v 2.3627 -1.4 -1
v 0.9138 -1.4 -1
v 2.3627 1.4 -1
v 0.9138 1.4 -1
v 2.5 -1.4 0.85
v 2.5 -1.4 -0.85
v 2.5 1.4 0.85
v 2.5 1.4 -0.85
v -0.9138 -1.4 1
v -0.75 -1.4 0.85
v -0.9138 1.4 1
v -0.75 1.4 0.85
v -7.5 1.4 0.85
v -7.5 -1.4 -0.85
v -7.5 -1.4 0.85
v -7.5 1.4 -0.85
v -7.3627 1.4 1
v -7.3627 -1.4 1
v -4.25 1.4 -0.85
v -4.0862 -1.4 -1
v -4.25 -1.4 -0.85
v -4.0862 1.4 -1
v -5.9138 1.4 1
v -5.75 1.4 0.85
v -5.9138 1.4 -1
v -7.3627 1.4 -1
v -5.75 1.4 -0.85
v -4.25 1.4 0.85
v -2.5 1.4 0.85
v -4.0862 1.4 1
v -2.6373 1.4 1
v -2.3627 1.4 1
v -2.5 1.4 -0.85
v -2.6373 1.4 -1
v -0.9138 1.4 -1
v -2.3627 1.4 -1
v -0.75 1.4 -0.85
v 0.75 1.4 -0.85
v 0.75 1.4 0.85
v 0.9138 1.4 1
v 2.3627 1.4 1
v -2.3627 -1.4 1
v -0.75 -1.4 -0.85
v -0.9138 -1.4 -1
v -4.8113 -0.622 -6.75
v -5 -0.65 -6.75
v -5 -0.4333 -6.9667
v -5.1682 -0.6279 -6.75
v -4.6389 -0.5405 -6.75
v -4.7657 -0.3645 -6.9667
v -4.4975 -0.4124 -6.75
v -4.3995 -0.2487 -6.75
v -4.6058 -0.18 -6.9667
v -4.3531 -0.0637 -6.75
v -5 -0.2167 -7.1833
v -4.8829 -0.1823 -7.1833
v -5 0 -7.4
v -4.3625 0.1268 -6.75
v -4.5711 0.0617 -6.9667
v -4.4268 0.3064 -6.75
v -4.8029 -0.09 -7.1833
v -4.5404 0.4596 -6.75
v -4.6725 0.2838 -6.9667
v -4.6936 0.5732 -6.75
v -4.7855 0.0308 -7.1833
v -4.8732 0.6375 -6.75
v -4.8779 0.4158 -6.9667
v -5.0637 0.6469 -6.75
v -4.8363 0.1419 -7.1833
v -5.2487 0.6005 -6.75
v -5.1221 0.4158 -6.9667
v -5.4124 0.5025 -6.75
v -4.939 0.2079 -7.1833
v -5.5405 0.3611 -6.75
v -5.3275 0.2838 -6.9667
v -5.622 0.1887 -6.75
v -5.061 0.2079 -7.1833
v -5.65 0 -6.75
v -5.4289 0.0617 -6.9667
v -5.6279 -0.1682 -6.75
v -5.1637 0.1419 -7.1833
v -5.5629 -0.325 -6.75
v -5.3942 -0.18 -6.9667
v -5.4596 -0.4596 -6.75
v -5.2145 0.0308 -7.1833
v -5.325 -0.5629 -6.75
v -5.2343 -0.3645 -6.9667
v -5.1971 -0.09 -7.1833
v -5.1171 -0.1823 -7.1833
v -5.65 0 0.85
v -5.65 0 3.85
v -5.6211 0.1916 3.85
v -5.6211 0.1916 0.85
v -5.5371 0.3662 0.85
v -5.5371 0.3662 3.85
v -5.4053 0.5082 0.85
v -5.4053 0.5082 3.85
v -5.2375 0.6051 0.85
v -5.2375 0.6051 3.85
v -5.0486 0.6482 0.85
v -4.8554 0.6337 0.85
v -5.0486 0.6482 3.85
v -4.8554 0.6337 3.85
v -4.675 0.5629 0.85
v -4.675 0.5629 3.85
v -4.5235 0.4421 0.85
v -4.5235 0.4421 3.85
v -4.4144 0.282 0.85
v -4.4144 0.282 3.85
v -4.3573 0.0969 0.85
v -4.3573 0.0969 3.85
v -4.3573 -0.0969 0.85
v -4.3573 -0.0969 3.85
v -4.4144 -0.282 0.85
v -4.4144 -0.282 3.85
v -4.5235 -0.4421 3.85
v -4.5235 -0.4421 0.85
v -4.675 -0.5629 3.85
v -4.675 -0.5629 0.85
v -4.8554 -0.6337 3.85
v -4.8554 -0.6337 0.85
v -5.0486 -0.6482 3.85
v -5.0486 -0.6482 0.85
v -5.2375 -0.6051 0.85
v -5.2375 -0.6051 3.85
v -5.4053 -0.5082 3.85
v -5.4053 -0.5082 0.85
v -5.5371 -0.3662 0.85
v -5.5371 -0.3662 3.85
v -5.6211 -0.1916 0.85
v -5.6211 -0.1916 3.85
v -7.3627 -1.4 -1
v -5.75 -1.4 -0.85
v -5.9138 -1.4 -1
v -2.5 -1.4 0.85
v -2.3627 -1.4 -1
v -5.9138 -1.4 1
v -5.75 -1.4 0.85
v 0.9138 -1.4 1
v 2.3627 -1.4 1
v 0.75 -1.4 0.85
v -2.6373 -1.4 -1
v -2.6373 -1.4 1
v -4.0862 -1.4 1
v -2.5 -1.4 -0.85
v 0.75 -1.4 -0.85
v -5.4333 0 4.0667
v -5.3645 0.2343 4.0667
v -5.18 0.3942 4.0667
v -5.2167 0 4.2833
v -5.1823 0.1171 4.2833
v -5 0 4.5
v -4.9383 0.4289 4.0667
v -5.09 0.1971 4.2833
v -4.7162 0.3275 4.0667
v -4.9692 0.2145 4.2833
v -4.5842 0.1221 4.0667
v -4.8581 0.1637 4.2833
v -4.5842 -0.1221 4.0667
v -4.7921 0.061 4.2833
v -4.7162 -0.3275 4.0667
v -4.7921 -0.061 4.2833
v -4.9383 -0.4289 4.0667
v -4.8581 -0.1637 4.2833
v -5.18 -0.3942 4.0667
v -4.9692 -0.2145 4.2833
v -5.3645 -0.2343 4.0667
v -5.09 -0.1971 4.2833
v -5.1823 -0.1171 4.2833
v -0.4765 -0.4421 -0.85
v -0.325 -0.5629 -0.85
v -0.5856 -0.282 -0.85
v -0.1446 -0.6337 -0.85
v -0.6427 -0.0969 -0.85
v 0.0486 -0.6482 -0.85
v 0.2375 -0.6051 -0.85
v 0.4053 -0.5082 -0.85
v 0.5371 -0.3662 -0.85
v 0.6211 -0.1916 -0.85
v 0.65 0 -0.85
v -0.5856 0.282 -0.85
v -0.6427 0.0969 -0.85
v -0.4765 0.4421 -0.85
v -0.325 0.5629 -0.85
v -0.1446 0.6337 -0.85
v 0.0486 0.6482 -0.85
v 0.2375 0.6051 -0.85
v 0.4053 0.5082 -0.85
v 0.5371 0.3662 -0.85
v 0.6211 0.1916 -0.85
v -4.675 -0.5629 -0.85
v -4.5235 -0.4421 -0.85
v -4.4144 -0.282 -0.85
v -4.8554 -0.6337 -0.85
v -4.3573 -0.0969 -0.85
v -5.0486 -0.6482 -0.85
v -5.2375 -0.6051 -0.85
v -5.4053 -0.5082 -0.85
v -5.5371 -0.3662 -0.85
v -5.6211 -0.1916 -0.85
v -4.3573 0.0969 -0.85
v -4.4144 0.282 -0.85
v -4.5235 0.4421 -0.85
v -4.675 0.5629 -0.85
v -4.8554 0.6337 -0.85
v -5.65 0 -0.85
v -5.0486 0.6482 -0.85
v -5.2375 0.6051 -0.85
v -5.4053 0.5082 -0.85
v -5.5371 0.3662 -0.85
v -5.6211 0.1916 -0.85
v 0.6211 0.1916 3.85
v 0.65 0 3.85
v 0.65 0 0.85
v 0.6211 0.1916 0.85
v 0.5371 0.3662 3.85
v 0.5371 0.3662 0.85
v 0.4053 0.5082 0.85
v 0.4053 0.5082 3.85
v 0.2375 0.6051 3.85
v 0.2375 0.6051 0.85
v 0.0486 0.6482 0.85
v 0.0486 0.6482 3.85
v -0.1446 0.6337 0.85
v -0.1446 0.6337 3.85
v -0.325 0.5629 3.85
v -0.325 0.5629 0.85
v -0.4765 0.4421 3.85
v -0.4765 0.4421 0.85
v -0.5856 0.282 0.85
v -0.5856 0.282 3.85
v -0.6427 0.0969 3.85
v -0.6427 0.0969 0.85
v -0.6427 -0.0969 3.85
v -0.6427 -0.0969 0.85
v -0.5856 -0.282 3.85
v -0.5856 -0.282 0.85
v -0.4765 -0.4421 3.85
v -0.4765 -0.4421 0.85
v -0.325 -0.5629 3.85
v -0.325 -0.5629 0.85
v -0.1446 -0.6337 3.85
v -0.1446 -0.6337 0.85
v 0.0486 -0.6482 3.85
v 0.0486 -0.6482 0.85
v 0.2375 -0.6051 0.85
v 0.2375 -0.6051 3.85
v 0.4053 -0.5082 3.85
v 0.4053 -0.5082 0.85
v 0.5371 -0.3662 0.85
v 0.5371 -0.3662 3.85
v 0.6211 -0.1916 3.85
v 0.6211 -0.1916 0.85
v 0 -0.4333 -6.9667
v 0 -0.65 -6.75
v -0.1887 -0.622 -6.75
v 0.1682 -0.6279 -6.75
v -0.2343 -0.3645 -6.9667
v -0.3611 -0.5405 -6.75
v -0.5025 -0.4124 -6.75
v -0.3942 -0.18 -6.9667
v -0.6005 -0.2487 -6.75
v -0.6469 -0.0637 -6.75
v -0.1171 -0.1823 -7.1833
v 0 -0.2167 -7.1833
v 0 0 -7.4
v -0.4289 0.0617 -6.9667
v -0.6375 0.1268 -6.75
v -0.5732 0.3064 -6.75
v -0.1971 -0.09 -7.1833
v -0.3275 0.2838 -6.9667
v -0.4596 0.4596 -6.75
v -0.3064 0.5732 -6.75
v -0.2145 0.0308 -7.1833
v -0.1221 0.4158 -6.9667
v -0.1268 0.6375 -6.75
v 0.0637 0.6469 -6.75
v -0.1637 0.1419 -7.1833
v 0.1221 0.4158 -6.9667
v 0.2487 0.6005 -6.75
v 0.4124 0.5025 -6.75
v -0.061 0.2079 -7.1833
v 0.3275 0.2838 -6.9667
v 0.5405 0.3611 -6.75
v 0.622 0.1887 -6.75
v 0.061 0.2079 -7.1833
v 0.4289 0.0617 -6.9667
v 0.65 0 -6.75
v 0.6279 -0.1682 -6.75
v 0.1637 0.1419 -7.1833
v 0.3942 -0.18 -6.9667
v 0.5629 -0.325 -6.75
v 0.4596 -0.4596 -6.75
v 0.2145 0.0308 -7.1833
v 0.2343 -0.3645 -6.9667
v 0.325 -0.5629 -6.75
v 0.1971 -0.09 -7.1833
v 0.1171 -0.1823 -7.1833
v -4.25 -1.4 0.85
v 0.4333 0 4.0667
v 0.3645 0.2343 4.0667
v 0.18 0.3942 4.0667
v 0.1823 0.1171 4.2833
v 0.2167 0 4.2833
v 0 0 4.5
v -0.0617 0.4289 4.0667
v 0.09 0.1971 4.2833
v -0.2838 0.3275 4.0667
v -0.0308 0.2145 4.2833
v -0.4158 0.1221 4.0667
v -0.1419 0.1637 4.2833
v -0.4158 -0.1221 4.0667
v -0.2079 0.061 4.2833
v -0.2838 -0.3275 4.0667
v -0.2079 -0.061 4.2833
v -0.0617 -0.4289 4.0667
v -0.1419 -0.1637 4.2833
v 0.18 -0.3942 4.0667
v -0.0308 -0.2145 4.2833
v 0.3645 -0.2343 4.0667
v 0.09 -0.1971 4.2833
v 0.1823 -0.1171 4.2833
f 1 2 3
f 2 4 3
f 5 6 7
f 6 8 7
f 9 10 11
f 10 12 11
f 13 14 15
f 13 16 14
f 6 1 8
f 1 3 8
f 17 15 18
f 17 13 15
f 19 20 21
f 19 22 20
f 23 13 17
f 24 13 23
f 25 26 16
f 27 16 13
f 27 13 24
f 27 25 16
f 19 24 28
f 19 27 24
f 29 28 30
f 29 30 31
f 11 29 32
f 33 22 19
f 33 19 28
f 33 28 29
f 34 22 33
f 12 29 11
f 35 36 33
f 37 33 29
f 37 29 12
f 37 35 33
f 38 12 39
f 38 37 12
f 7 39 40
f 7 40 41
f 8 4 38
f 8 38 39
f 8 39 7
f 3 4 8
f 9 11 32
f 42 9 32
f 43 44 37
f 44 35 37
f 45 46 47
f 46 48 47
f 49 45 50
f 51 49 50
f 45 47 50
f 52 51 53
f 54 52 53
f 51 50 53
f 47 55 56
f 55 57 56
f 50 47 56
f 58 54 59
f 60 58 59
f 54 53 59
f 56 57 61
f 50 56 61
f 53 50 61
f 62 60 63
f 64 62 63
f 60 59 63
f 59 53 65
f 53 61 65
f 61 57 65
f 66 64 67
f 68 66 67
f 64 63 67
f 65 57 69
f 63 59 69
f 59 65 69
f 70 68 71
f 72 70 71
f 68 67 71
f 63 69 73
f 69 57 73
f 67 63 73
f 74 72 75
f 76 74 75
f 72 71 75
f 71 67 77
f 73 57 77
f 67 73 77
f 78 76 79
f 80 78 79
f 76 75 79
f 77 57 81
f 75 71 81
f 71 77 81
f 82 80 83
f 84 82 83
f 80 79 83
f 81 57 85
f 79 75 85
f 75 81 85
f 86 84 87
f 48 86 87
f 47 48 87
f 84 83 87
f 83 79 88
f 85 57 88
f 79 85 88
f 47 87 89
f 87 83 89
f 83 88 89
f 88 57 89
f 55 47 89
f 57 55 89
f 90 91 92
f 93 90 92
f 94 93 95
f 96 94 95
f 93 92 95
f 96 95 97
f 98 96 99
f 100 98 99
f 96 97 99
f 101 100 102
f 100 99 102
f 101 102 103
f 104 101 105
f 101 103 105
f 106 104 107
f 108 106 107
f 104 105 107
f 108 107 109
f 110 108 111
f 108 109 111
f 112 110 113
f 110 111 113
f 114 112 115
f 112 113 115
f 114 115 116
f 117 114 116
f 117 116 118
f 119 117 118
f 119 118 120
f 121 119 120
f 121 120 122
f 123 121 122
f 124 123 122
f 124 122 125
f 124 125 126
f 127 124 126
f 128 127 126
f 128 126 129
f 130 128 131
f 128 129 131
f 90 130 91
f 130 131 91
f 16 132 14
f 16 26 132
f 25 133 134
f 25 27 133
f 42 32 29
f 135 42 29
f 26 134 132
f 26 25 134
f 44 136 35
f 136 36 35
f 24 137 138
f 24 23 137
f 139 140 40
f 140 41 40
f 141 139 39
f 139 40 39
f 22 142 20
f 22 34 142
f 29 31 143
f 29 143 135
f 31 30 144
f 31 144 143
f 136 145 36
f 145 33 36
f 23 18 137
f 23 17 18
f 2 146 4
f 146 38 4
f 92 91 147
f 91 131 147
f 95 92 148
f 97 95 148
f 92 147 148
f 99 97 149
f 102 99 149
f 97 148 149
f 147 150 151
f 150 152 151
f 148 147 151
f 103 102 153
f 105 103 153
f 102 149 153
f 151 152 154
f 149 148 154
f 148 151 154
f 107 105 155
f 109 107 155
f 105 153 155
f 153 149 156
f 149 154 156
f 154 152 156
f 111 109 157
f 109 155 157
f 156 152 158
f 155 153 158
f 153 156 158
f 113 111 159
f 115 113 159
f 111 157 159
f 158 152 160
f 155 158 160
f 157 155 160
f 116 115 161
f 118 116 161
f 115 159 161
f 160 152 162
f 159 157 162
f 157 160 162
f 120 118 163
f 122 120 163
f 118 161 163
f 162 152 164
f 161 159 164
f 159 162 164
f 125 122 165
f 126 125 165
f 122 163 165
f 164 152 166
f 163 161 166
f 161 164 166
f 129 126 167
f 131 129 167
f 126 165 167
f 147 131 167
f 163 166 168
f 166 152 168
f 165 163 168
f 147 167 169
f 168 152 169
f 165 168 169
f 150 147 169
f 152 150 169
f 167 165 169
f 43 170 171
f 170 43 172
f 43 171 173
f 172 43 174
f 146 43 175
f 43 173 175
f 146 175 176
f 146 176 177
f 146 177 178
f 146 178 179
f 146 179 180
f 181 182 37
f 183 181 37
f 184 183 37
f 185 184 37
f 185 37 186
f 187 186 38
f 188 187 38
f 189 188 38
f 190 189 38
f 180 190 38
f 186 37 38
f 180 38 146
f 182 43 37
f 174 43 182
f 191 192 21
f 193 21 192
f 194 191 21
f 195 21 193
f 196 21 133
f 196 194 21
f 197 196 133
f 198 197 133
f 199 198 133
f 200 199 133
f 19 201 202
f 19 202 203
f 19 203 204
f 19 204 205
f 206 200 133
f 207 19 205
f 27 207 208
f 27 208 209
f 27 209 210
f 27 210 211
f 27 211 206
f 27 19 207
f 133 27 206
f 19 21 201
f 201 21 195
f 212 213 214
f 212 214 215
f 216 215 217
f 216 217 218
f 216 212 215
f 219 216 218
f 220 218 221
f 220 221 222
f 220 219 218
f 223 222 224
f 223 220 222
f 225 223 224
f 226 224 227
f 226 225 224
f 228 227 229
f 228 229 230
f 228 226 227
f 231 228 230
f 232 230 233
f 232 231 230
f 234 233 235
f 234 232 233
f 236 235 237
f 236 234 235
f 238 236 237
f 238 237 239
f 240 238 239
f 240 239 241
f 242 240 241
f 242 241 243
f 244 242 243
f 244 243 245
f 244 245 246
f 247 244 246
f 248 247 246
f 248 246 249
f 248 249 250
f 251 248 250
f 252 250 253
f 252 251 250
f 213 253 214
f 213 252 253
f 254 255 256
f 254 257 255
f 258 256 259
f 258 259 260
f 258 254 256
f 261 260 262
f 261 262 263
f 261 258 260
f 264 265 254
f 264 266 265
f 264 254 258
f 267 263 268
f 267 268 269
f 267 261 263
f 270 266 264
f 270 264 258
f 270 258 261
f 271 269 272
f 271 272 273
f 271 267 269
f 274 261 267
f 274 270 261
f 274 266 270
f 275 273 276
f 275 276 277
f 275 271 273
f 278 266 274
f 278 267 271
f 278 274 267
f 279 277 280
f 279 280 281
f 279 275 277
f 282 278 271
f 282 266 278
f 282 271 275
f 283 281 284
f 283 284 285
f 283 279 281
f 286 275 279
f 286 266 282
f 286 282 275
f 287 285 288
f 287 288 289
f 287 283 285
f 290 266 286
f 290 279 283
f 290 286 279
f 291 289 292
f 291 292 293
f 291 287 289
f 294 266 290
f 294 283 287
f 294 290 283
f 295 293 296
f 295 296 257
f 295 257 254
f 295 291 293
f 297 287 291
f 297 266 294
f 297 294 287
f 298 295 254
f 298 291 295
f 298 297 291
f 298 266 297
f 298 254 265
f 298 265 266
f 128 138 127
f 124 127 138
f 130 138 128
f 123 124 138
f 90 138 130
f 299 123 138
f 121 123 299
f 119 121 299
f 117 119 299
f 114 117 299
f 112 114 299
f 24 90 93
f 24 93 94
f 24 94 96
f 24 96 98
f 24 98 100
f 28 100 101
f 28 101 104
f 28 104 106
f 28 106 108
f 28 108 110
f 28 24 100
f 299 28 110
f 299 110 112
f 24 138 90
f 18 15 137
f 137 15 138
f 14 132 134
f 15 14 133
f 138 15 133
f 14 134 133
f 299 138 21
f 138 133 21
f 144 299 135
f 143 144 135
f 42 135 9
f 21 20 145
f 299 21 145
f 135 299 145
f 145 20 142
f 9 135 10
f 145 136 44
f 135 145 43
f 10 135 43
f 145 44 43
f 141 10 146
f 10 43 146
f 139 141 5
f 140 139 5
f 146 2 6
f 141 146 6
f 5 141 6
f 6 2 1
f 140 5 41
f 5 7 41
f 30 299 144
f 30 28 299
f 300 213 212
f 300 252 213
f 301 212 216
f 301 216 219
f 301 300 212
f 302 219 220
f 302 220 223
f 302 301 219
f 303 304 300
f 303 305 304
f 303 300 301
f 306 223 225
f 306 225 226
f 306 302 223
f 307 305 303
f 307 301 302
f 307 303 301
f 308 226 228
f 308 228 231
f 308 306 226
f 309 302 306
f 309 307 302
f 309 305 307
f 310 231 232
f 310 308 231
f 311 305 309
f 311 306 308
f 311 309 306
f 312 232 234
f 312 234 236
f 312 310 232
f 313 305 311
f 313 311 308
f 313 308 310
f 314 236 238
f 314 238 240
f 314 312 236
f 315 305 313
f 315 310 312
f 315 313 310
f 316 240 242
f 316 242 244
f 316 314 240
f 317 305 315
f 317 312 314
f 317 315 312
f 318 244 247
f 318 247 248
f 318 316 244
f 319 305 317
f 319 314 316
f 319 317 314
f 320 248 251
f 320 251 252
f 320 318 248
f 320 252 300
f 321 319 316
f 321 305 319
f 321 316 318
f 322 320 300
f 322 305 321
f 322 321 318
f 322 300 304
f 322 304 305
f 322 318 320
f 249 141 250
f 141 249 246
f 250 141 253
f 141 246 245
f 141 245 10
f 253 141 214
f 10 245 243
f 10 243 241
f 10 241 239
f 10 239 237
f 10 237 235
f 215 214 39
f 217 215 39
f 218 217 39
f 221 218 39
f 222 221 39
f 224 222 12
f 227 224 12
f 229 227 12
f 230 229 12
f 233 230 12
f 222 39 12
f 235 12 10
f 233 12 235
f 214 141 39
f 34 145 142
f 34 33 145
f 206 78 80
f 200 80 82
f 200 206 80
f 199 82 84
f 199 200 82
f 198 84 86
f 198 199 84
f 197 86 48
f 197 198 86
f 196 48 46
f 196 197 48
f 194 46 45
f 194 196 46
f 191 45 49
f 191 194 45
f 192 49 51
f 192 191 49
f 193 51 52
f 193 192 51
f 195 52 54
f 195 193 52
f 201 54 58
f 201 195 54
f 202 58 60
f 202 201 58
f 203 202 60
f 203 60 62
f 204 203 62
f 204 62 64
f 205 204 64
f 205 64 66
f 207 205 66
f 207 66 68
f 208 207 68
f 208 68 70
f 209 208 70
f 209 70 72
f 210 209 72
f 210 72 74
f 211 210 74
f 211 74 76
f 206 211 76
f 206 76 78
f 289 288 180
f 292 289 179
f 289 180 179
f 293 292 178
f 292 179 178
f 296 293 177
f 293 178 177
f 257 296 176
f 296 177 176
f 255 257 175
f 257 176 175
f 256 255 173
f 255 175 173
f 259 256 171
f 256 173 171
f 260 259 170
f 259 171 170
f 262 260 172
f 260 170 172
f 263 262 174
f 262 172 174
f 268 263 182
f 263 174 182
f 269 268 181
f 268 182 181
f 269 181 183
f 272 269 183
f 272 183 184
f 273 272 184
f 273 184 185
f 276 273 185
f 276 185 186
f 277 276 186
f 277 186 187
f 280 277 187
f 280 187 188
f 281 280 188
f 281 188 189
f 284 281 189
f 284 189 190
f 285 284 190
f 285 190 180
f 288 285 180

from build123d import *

# Parameters (mm, degrees)
BOSS_EXTRUDE1_DEPTH = 1.4
SKETCH2_R           = 0.65
BOSS_EXTRUDE2_DEPTH = 5.9
BOSS_EXTRUDE3_START = 3
SKETCH3_R           = 0.65
BOSS_EXTRUDE3_DEPTH = 3
SKETCH5_R           = 0.65
BOSS_EXTRUDE4_DEPTH = 0.75
BOSS_EXTRUDE4_TAPER = 45


with BuildPart() as part:
    # Sketch1 → Boss-Extrude1 (new, symmetric)
    with BuildSketch(Plane(origin=(0, 0, 0), x_dir=(1, 0, 0), z_dir=(0, 1, 0))):
        Polygon((-2.5, -0.85), (-2.5, 0.85), (-2.362664546, 1), (-0.913832422, 1), (-0.75, 0.85), (0.75, 0.85), (0.913832422, 1), (2.362664546, 1), (2.5, 0.85), (2.5, -0.85), (2.362664546, -1), (0.913832422, -1), (0.75, -0.85), (-0.75, -0.85), (-0.913832422, -1), (-2.362664546, -1), align=None)
    extrude(amount=BOSS_EXTRUDE1_DEPTH, both=True)

    # Sketch2 → Boss-Extrude2 (add)
    with BuildSketch(Plane(origin=(0, 0, -0.85), x_dir=(-1, 0, 0), z_dir=(0, 0, -1))):
        with Locations(Location((0, 0, 0), (0, 0, 180))):
            Circle(SKETCH2_R)
    extrude(amount=BOSS_EXTRUDE2_DEPTH)

    # Sketch3 → Boss-Extrude3 (add)
    with BuildSketch(Plane.XY.offset(0.85).offset(BOSS_EXTRUDE3_START)):
        Circle(SKETCH3_R)
    extrude(amount=-BOSS_EXTRUDE3_DEPTH)

    # Sketch5 → Boss-Extrude4 (add)
    with BuildSketch(Plane.XY.offset(3.85)):
        Circle(SKETCH5_R)
    extrude(amount=BOSS_EXTRUDE4_DEPTH, taper=BOSS_EXTRUDE4_TAPER)

    # Boss-Extrude5 cone 1 section (through the dimple's axis) → Boss-Extrude5 (revolve)
    with BuildSketch(Plane(origin=(0, 0, -6.75), x_dir=(0, -1, 0), z_dir=(1, 0, 0))):
        Polygon((0, 0), (0.65, 0), (0, 0.65), align=None)
    revolve(axis=Axis((0, 0, -6.75), (0, 0, -1)))

    # Mirror1: part across plane


with BuildPart() as part_1:
    add(part.part)
    add(part.part.mirror(Plane(origin=(-2.5, 1.4, 0.85), x_dir=(0, 0, 1), z_dir=(1, 0, 0))))


solid = part_1.part
